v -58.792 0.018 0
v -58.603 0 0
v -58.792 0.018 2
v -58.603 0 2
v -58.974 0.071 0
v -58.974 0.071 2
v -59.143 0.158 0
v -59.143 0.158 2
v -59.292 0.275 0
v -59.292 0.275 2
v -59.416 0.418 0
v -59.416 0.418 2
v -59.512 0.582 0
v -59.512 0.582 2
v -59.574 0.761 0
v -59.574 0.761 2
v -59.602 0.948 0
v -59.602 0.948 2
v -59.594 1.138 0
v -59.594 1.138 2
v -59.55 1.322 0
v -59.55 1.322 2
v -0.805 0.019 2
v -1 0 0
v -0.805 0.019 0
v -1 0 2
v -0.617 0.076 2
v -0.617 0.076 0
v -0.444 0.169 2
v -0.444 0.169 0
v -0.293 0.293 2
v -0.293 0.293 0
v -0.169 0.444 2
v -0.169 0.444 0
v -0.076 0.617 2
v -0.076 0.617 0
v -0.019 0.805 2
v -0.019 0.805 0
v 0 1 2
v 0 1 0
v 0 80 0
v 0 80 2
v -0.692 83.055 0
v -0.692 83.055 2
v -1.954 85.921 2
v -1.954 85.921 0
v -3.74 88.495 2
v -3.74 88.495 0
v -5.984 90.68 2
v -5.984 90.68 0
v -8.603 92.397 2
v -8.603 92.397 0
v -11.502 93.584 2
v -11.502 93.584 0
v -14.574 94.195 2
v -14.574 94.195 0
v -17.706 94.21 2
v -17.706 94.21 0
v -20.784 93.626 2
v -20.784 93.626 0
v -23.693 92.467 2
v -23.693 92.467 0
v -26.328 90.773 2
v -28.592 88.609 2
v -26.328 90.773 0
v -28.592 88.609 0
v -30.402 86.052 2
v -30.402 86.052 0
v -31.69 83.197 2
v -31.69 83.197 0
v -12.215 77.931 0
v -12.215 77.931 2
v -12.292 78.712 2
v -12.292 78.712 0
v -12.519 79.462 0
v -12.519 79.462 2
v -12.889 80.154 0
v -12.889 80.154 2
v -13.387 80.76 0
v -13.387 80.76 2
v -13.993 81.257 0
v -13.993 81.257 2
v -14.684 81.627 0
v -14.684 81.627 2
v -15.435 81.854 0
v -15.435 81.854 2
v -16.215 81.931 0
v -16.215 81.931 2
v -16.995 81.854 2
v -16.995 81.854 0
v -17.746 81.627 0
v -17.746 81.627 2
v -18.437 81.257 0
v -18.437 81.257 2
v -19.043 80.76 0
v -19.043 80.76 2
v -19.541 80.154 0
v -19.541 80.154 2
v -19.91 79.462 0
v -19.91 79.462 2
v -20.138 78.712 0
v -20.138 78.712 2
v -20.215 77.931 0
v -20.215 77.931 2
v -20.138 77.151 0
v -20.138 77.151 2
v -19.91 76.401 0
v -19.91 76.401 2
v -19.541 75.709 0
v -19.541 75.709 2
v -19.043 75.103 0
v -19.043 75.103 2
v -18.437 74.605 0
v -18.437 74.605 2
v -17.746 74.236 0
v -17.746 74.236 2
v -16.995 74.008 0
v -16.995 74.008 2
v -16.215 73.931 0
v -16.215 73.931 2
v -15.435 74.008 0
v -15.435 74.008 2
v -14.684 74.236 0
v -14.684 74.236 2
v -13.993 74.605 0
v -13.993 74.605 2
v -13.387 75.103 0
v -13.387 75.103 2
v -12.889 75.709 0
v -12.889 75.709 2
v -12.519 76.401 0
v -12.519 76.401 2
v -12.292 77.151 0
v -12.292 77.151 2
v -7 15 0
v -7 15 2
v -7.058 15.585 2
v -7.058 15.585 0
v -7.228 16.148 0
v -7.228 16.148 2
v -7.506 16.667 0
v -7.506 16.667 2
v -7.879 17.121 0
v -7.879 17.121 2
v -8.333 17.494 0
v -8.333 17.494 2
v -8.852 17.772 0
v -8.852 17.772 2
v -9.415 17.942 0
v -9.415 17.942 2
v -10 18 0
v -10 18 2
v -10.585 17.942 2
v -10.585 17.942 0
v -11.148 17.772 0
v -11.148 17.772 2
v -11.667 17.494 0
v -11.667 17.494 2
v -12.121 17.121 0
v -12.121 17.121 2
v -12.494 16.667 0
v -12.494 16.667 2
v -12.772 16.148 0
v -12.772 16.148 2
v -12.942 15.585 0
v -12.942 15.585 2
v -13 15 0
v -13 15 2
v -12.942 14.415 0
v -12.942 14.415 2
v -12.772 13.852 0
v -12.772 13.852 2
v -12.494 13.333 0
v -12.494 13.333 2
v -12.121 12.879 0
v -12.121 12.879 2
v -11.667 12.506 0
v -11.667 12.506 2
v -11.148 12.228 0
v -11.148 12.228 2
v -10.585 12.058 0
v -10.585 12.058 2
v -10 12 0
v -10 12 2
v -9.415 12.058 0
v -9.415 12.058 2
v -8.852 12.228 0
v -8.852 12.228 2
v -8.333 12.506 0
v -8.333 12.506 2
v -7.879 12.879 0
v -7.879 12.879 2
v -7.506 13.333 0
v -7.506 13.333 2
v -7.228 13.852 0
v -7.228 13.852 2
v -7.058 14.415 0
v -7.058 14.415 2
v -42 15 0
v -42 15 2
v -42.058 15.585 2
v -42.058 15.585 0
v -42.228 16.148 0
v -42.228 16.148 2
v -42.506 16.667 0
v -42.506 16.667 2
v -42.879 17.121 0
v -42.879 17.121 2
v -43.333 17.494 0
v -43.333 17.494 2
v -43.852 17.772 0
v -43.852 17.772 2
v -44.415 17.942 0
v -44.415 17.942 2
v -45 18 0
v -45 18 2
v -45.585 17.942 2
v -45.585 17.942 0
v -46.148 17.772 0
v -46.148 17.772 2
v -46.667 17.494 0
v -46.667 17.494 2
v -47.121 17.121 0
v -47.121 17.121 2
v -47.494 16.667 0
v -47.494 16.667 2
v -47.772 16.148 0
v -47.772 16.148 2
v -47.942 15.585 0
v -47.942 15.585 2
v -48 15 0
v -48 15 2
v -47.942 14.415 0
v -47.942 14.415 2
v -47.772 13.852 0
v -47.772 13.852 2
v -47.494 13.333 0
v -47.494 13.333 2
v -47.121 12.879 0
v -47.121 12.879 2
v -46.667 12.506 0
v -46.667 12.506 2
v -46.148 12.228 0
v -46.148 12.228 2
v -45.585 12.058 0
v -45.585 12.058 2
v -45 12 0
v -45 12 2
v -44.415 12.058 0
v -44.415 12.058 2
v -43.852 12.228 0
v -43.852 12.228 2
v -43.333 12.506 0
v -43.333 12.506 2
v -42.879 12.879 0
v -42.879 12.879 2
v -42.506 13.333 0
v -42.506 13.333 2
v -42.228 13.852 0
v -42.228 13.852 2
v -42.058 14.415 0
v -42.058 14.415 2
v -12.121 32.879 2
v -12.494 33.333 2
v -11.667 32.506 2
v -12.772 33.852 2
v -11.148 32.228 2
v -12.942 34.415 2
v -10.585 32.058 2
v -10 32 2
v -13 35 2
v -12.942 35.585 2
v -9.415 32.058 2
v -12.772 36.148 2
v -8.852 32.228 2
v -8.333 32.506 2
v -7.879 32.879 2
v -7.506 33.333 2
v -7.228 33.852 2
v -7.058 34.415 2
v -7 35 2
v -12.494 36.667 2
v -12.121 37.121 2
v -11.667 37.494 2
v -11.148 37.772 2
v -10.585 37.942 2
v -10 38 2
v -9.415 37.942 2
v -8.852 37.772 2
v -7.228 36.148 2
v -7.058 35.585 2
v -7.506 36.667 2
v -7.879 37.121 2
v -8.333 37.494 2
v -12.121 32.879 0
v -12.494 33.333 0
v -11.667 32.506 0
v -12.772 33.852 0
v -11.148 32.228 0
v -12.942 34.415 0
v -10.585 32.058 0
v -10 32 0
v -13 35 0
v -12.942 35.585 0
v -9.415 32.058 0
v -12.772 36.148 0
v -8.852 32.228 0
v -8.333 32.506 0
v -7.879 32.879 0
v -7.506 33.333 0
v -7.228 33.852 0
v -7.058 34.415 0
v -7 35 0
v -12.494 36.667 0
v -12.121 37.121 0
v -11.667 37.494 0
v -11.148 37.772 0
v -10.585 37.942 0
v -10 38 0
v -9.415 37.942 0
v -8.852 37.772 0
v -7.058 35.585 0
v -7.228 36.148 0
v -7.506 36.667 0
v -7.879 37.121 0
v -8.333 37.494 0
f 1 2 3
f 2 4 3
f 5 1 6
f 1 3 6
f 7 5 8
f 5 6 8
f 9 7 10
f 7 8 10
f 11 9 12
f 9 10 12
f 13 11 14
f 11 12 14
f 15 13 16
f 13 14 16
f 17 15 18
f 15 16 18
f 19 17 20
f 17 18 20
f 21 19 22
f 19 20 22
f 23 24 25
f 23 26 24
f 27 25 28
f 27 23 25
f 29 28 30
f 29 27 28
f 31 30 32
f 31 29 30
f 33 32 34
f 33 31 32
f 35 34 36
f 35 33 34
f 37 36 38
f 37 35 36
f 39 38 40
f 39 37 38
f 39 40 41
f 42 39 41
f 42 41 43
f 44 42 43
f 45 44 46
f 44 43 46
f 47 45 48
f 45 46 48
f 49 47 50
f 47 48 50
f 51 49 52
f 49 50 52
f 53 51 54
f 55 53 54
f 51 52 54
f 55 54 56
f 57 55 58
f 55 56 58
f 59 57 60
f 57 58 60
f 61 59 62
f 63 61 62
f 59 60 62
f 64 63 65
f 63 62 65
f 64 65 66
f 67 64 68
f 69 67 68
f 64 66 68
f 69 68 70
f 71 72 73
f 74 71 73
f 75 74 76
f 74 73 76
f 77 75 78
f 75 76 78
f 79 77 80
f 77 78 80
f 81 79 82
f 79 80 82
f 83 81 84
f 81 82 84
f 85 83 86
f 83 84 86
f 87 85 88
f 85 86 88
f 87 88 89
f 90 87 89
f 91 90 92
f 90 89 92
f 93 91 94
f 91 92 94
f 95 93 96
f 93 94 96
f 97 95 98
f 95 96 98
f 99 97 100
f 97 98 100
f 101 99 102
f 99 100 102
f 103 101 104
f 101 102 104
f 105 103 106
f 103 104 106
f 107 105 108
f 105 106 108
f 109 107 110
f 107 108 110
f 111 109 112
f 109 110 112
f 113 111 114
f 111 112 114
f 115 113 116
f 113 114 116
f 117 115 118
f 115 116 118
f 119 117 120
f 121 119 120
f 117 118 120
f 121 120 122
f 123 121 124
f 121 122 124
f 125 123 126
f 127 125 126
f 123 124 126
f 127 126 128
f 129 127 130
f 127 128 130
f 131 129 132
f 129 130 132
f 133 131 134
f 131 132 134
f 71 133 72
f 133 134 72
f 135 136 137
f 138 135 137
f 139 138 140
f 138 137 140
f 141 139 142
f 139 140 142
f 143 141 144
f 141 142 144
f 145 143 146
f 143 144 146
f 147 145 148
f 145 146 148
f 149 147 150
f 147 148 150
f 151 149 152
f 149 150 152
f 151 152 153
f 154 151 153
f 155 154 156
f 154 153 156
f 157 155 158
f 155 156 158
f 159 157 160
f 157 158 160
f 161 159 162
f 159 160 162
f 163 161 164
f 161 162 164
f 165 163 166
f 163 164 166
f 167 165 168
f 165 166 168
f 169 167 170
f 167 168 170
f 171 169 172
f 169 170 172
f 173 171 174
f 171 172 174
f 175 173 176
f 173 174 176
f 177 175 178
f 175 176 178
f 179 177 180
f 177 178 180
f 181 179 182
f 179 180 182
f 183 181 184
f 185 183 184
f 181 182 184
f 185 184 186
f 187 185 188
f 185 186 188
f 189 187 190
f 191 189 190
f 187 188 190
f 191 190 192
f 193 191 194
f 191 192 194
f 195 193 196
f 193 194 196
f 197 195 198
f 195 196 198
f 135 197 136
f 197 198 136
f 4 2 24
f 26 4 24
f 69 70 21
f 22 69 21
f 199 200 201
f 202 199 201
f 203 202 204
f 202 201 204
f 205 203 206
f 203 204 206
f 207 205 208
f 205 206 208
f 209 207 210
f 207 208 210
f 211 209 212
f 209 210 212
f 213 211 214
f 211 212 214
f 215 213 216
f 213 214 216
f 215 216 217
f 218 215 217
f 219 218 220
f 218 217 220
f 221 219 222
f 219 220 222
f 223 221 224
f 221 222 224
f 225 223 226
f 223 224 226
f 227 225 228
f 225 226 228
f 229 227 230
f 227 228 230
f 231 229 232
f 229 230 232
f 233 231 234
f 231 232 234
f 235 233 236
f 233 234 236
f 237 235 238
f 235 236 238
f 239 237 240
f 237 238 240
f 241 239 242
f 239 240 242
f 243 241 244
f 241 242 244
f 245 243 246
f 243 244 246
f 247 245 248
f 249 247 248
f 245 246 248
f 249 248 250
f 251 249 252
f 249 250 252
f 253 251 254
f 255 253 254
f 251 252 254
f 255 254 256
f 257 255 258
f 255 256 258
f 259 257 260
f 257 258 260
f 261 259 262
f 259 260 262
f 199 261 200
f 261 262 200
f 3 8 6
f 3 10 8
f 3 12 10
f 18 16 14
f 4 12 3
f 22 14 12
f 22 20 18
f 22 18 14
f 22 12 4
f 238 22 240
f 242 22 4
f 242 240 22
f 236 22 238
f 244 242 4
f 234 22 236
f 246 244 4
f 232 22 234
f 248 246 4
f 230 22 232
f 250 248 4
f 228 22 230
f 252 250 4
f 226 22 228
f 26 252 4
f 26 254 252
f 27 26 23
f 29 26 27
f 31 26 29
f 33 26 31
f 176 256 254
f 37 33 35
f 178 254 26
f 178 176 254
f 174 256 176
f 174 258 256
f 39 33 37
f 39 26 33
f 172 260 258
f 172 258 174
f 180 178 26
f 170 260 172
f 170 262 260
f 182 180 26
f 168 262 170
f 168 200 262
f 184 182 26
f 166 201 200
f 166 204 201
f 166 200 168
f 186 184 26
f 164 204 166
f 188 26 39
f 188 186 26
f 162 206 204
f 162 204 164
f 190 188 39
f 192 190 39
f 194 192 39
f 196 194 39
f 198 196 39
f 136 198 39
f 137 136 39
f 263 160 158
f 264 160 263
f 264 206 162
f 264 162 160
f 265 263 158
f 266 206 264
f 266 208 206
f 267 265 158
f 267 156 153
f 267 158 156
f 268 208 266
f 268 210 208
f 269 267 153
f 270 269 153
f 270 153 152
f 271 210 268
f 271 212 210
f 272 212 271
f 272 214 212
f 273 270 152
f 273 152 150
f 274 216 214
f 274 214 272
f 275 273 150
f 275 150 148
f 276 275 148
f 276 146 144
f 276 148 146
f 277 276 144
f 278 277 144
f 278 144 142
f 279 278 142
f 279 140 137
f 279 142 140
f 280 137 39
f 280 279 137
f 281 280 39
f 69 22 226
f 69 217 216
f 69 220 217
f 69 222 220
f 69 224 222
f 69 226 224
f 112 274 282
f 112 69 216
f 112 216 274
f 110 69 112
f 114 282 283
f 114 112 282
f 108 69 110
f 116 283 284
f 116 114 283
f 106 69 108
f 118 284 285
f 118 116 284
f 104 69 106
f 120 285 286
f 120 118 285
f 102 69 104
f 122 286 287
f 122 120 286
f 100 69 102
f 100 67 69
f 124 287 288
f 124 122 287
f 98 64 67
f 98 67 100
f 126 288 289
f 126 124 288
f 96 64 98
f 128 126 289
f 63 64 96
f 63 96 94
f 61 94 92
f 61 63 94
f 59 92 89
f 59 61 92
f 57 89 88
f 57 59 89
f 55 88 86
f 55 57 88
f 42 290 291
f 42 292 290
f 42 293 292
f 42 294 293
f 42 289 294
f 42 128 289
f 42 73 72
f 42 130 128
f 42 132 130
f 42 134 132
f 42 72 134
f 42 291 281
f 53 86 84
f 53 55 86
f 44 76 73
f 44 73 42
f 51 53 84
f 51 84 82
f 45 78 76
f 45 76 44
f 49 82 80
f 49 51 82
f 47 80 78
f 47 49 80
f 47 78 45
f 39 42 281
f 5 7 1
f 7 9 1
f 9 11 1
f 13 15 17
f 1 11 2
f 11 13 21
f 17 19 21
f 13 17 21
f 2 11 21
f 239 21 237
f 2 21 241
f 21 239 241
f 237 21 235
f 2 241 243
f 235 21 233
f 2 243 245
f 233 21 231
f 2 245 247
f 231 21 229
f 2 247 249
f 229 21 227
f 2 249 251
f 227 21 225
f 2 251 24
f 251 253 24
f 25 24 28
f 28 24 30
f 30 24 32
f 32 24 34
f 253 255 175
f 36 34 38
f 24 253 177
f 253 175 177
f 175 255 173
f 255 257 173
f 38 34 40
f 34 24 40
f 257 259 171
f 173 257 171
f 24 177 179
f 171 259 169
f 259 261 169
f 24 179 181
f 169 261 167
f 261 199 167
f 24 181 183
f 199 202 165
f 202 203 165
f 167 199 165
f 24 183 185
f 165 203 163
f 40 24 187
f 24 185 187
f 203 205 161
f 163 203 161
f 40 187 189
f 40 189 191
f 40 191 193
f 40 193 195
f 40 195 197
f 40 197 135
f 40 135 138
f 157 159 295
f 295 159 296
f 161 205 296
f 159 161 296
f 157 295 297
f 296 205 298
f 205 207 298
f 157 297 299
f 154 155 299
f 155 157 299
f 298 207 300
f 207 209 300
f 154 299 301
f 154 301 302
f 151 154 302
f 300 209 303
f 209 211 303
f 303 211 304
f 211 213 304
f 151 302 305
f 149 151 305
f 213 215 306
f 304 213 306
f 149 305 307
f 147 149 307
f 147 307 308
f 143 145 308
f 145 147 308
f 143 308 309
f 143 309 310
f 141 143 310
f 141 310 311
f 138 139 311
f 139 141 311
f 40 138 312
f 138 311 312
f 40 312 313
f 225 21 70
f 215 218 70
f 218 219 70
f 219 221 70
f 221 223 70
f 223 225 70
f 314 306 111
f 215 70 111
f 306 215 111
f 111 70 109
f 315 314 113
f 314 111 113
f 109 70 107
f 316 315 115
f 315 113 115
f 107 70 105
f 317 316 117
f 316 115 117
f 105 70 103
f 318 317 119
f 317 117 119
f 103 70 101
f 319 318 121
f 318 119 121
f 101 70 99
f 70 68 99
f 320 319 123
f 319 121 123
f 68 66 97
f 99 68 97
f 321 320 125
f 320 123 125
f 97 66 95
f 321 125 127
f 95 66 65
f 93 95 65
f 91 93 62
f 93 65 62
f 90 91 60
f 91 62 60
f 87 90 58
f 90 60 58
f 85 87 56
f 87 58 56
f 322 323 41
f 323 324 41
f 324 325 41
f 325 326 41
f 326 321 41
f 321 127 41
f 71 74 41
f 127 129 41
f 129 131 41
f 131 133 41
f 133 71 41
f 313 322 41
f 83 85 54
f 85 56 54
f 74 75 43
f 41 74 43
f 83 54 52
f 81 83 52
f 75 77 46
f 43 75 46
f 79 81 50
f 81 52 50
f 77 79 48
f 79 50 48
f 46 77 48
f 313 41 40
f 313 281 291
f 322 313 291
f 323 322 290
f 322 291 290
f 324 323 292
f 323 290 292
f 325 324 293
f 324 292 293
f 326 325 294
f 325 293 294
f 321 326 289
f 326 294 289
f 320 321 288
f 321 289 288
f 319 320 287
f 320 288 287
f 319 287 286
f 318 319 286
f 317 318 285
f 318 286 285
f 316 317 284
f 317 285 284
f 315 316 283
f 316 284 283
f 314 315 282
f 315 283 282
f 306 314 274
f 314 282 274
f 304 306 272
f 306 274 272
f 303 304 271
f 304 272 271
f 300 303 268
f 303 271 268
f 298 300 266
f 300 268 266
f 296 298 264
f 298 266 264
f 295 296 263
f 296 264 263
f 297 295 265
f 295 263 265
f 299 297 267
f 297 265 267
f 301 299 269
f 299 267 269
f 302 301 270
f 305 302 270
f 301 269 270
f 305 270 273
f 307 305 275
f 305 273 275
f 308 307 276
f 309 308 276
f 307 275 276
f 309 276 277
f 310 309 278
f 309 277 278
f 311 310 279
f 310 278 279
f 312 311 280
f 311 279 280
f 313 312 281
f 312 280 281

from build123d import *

# Parameters (mm, degrees)
EXTRUDE_1_DEPTH     = 2
FILLET_1_R          = 1
SKETCH_2_R          = 4
SKETCH_2_R_2        = 3
CUT_EXTRUDE_1_DEPTH = 2


with BuildPart() as part:
    # 草图1 → 凸台-拉伸1 (new body)
    with BuildSketch(Plane.XY):
        with BuildLine():
            Line((-60, 0), (0, 0))
            Line((0, 0), (0, 75.862592271))
            Line((0, 75.862592271), (0, 80))
            ThreePointArc((0, 80), (-14.574173945, 94.195139291), (-31.689992774, 83.197081668))
            Line((-31.689992774, 83.197081668), (-60, 0))
        make_face()
    extrude(amount=EXTRUDE_1_DEPTH)

    # 圆角1
    fillet_1_edges = [part.edges().sort_by_distance(p)[0] for p in [
        (0, 0, 1),
        (-60, 0, 1),
    ]]
    fillet(fillet_1_edges, radius=FILLET_1_R)

    # 草图2 → 切除-拉伸1 (cut)
    with BuildSketch(Plane.XY.offset(2)):
        with Locations((-16.214970621, 77.931296136)):
            Circle(SKETCH_2_R)
        with Locations((-10, 35)):
            Circle(SKETCH_2_R_2)
        with Locations((-10, 15)):
            Circle(SKETCH_2_R_2)
        with Locations((-45, 15)):
            Circle(SKETCH_2_R_2)
    extrude(amount=-CUT_EXTRUDE_1_DEPTH, mode=Mode.SUBTRACT)


solid = part.part
